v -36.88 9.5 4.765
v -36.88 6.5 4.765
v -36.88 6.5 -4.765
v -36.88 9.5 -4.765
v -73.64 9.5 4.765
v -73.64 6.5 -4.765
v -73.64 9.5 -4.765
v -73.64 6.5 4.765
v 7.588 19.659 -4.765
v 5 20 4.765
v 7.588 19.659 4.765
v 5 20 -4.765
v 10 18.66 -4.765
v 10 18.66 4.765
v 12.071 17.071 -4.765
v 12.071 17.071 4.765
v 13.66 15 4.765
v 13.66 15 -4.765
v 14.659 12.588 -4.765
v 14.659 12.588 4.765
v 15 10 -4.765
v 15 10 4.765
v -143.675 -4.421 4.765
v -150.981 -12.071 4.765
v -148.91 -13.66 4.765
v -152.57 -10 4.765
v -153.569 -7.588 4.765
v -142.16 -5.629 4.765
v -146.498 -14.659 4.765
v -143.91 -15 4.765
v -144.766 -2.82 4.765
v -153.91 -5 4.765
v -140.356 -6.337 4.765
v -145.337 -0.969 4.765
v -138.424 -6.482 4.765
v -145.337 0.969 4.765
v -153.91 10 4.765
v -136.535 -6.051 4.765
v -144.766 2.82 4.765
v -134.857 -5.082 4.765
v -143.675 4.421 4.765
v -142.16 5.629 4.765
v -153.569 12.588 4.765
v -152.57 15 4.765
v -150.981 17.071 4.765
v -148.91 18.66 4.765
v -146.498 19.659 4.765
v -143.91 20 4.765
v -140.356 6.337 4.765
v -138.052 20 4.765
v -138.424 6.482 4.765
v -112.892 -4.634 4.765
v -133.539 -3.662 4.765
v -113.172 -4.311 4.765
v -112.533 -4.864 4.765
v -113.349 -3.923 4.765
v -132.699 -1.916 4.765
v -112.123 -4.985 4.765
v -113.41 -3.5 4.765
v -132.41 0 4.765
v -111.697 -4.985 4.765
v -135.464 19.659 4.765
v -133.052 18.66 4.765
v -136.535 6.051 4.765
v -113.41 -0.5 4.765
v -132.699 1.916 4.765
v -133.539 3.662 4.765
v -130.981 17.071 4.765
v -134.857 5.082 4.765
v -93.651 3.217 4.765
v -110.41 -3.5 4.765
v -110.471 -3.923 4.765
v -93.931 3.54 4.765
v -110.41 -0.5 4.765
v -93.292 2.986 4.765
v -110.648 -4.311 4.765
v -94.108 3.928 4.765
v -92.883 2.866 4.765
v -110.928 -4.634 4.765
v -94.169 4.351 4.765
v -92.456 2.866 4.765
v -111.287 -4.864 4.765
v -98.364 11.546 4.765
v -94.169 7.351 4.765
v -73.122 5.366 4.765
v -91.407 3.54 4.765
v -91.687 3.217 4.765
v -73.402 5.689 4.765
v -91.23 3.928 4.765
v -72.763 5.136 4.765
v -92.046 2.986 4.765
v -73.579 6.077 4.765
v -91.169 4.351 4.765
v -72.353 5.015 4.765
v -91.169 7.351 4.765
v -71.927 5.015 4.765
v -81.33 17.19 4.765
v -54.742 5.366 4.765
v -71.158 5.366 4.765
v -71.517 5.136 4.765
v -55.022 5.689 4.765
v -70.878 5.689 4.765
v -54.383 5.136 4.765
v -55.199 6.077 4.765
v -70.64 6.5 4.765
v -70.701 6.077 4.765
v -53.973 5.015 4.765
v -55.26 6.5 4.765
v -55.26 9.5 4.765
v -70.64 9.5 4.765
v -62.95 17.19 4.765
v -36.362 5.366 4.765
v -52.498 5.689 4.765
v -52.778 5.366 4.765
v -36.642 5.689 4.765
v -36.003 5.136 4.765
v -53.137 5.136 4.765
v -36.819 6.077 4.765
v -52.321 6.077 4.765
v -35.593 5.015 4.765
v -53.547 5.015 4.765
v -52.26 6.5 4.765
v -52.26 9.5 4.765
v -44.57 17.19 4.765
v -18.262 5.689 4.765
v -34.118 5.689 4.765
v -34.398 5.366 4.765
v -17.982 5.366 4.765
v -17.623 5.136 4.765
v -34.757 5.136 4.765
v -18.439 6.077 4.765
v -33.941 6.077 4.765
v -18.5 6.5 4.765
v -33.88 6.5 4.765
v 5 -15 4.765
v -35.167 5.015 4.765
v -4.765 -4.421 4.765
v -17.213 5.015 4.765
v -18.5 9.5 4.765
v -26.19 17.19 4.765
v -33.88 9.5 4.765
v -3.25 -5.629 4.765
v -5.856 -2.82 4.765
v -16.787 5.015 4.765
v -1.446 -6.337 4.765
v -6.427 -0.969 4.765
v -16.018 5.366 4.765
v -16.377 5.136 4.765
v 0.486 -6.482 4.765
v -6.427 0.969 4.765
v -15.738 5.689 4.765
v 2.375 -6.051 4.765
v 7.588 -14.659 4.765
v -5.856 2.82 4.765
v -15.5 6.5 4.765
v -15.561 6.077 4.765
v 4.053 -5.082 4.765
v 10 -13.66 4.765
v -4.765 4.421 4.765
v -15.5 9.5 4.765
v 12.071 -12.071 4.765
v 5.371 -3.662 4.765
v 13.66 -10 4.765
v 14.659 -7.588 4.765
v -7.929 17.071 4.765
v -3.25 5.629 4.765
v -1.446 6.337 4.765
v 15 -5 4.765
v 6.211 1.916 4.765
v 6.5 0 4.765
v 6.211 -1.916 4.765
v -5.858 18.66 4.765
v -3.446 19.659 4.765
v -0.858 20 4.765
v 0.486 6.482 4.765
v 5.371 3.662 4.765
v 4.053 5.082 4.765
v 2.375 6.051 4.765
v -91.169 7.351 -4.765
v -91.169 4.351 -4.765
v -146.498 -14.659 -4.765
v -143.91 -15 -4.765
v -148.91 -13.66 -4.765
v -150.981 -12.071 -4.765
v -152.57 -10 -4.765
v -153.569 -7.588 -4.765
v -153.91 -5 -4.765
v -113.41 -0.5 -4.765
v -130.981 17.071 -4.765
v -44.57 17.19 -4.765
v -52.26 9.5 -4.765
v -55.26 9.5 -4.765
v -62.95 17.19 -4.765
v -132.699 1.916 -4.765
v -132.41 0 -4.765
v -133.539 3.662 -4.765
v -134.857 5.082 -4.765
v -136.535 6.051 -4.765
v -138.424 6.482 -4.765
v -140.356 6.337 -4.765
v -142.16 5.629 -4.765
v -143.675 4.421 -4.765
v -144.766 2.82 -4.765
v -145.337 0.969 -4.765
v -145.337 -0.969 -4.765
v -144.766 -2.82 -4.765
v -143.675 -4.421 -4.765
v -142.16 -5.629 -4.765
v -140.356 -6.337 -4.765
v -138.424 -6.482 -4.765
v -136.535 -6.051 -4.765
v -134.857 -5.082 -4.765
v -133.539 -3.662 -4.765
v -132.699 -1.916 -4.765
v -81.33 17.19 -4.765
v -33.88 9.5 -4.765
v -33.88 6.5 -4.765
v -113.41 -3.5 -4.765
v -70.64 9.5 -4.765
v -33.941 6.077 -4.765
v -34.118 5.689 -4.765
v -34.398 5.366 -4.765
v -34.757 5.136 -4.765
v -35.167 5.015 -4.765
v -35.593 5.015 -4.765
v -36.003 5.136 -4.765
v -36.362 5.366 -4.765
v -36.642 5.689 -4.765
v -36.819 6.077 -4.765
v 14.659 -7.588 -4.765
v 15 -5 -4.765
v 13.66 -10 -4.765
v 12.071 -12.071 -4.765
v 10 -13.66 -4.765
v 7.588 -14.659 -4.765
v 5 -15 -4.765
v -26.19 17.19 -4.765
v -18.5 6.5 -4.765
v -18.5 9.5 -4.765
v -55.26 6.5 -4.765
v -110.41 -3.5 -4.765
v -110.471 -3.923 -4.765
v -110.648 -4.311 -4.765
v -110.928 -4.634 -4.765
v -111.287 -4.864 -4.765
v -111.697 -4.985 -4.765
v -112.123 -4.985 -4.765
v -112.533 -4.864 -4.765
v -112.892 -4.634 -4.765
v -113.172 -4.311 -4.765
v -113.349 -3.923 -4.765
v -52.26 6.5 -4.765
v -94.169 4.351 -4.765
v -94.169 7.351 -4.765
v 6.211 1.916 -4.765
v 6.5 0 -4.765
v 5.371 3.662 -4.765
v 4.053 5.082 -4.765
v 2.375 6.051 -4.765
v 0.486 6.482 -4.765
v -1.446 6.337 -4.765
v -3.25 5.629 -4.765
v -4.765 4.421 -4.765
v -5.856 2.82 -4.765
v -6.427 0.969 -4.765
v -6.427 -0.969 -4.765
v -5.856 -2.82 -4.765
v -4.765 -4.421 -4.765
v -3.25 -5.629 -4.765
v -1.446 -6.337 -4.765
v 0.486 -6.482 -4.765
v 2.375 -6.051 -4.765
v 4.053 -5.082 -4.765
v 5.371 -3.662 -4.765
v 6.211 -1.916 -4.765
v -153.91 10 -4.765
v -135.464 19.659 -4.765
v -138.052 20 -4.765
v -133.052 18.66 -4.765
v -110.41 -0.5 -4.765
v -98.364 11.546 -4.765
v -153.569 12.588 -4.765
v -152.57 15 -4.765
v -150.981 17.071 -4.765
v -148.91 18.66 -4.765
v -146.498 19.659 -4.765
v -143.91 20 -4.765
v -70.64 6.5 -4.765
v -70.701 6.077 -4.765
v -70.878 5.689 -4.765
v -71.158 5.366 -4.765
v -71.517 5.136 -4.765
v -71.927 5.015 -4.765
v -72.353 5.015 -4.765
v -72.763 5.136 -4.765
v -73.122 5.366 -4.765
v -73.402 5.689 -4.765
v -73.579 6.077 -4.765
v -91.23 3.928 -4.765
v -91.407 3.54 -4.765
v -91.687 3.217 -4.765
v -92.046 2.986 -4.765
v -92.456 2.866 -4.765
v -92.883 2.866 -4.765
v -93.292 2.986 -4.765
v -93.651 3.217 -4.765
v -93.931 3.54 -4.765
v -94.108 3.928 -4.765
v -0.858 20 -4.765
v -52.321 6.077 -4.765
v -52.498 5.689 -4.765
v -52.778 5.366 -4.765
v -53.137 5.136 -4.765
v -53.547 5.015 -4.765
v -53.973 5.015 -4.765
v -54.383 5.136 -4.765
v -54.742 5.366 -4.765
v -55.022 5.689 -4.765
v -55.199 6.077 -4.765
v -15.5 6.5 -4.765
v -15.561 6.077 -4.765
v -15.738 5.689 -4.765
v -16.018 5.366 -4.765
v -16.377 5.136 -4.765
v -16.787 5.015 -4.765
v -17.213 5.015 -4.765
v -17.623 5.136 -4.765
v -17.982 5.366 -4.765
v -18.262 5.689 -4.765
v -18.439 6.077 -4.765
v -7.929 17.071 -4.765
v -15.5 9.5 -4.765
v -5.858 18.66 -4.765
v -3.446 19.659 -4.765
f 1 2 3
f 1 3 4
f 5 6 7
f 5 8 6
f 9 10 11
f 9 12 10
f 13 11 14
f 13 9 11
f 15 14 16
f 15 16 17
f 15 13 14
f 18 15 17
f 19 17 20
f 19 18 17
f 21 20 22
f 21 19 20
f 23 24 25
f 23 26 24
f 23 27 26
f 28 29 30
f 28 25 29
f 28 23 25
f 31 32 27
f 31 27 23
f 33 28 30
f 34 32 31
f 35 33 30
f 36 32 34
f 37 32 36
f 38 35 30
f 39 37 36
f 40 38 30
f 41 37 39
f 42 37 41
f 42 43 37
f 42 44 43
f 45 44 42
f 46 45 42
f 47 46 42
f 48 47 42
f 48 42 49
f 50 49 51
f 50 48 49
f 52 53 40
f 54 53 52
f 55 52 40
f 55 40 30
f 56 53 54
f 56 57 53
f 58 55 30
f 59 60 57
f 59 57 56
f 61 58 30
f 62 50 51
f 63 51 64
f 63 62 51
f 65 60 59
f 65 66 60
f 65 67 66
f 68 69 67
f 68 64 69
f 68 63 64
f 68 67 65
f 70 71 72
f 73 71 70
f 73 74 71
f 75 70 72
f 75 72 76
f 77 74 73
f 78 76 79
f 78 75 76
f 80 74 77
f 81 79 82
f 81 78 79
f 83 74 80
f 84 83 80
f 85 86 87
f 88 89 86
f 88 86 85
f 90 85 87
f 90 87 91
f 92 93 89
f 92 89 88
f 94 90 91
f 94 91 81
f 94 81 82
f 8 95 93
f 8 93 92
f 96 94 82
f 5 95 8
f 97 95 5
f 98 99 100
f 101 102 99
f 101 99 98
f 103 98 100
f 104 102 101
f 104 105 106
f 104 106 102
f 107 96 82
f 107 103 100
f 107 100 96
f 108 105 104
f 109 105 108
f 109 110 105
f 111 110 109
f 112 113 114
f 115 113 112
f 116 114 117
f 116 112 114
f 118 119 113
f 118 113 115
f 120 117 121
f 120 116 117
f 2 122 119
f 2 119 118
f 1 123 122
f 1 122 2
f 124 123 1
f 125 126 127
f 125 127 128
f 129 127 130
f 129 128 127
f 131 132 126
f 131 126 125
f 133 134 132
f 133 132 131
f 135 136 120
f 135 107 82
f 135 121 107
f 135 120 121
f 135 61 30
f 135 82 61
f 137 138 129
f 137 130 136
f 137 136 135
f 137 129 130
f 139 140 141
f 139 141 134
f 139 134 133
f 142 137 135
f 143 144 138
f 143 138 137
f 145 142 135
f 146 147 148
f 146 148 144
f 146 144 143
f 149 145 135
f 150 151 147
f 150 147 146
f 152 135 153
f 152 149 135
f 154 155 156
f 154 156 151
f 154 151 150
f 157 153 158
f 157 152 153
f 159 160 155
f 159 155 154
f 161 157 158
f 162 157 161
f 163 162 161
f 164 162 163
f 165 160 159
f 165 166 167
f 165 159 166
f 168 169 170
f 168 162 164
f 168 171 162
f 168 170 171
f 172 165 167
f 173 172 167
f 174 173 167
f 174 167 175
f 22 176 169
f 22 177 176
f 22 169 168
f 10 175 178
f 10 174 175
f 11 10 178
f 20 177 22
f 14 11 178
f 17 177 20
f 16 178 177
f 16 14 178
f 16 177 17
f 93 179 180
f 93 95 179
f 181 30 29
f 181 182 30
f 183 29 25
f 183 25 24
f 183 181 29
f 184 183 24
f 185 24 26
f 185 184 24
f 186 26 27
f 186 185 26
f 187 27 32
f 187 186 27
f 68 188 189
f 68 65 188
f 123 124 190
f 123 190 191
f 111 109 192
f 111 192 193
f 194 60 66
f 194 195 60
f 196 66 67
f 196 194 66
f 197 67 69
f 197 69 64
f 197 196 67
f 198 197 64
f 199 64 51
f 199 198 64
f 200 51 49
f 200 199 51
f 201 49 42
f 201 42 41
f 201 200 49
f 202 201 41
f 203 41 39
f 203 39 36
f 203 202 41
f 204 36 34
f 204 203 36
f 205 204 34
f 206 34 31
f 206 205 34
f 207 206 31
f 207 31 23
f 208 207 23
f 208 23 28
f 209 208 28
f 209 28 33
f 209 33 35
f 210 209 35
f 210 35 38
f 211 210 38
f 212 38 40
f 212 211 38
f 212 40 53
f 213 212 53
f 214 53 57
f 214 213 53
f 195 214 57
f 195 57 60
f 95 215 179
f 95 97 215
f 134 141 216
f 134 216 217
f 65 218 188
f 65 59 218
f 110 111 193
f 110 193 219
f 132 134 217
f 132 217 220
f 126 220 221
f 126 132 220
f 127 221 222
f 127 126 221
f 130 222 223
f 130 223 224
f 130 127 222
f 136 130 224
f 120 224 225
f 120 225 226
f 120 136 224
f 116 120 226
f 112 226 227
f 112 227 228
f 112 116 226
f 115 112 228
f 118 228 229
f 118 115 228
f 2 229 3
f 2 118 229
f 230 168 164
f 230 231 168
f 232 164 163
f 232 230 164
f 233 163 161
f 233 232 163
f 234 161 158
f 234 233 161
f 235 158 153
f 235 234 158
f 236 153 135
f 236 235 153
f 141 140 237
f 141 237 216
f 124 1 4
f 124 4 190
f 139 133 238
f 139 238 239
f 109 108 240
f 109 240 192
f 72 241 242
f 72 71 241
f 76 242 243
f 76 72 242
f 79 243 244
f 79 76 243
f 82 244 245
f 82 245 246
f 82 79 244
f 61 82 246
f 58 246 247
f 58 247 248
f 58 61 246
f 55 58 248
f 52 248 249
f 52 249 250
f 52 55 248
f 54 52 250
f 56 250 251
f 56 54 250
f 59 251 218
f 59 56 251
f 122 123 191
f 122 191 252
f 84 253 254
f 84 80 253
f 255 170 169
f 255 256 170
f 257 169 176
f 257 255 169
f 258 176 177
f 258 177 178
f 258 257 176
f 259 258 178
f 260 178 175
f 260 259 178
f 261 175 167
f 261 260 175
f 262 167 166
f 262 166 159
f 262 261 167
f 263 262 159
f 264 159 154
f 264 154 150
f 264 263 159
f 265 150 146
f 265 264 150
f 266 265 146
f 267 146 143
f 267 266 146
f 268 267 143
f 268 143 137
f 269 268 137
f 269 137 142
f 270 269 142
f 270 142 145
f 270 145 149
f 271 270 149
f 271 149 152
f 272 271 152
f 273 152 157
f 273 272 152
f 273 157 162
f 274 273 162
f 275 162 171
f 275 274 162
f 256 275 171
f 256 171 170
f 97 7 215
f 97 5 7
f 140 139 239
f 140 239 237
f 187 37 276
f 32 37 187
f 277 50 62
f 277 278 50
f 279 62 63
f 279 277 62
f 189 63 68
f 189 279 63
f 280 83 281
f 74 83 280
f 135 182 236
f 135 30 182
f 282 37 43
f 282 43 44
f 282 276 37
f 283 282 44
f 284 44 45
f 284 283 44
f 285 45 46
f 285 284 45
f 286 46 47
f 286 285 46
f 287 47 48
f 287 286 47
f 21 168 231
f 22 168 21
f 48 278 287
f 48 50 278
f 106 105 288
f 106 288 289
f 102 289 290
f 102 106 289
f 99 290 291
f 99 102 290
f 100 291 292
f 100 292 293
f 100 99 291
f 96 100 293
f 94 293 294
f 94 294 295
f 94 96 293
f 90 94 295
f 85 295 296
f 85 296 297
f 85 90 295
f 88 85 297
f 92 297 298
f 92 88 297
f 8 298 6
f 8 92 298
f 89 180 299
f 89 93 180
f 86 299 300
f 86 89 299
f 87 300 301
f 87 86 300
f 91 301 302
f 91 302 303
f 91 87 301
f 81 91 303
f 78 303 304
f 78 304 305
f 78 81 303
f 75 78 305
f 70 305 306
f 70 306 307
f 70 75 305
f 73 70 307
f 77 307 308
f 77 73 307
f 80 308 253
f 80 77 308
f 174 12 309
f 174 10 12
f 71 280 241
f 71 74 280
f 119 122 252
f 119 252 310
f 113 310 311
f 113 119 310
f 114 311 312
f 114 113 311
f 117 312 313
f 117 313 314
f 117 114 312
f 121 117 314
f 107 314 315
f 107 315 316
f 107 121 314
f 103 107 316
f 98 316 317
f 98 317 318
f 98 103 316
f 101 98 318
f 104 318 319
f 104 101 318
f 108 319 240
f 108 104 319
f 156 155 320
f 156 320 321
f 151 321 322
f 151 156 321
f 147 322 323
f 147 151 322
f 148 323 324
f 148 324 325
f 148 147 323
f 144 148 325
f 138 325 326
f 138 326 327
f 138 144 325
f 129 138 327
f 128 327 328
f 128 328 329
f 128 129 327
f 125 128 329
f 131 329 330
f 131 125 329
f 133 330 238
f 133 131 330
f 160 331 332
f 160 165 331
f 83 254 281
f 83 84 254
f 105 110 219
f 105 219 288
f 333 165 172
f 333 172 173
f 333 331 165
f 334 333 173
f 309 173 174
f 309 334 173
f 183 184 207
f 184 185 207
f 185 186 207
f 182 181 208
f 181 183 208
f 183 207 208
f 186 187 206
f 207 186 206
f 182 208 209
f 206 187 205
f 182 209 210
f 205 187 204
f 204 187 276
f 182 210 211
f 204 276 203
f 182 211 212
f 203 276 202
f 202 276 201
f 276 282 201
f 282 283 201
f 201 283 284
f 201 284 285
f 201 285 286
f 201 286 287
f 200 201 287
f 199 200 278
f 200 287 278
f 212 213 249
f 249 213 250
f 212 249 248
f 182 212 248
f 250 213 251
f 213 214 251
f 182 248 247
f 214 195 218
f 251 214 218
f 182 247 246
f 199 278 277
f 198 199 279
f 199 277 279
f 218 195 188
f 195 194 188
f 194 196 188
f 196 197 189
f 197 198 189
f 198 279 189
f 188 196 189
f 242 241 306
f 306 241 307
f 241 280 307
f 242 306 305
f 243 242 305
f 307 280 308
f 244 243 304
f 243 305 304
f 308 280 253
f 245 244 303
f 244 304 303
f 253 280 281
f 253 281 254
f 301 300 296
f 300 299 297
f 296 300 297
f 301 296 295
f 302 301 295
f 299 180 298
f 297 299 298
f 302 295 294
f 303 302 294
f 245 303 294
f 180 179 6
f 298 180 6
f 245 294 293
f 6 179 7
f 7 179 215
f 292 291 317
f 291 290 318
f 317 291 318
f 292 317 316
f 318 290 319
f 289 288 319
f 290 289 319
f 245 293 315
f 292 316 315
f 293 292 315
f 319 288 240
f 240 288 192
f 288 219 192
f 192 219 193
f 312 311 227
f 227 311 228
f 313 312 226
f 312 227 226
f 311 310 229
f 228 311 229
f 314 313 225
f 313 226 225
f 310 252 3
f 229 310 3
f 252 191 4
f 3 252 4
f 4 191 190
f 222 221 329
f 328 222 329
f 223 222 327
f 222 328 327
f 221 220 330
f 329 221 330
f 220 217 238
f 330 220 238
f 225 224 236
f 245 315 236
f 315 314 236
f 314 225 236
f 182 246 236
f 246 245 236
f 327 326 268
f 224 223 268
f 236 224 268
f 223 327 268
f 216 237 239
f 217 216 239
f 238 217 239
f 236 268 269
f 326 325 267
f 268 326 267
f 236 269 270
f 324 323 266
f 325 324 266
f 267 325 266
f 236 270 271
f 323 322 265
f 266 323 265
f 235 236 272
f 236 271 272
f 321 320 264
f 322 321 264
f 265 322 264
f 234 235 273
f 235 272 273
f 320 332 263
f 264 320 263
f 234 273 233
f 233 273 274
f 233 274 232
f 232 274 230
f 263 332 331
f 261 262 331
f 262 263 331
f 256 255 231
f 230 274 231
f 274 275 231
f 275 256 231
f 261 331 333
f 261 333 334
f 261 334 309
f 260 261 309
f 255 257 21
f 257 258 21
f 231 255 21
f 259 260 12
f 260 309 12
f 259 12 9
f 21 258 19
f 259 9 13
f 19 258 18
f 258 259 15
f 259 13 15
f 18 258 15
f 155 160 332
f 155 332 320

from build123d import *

# Parameters (mm, degrees)
CROQUIS9_R              = 6.5
SALIENTE_EXTRUIR1_DEPTH = 4.765
REDONDEO1_R             = 10


with BuildPart() as part:
    # Croquis9 → Saliente-Extruir1 (new, symmetric)
    with BuildSketch(Plane.XY):
        with BuildLine():
            Line((-5, 20), (-15.5, 9.5))
            Line((-15.5, 9.5), (-15.5, 6.5))
            ThreePointArc((-15.5, 6.5), (-17, 5), (-18.5, 6.5))
            Line((-18.5, 6.5), (-18.5, 9.5))
            Line((-18.5, 9.5), (-26.19, 17.19))
            Line((-26.19, 17.19), (-33.88, 9.5))
            Line((-33.88, 9.5), (-33.88, 6.5))
            ThreePointArc((-33.88, 6.5), (-35.38, 5), (-36.88, 6.5))
            Line((-36.88, 6.5), (-36.88, 9.5))
            Line((-36.88, 9.5), (-44.57, 17.19))
            Line((-44.57, 17.19), (-52.26, 9.5))
            Line((-52.26, 9.5), (-52.26, 6.5))
            ThreePointArc((-52.26, 6.5), (-53.76, 5), (-55.26, 6.5))
            Line((-55.26, 6.5), (-55.26, 9.5))
            Line((-55.26, 9.5), (-62.95, 17.19))
            Line((-62.95, 17.19), (-70.64, 9.5))
            Line((-70.64, 9.5), (-70.64, 6.5))
            ThreePointArc((-70.64, 6.5), (-72.14, 5), (-73.64, 6.5))
            Line((-73.64, 6.5), (-73.64, 9.5))
            Line((-73.64, 9.5), (-81.33, 17.19))
            Line((-81.33, 17.19), (-91.169058454, 7.350941546))
            Line((-91.169058454, 7.350941546), (-91.169058454, 4.350941546))
            ThreePointArc((-91.169058454, 4.350941546), (-92.669058454, 2.850941546), (-94.169058454, 4.350941546))
            Line((-94.169058454, 4.350941546), (-94.169058454, 7.350941546))
            Line((-94.169058454, 7.350941546), (-98.364058454, 11.545941546))
            Line((-98.364058454, 11.545941546), (-110.41, -0.5))
            Line((-110.41, -0.5), (-110.41, -3.5))
            ThreePointArc((-110.41, -3.5), (-111.91, -5), (-113.41, -3.5))
            Line((-113.41, -3.5), (-113.41, -0.5))
            Line((-113.41, -0.5), (-133.91, 20))
            Line((-133.91, 20), (-153.91, 20))
            Line((-153.91, 20), (-153.91, -15))
            Line((-153.91, -15), (15, -15))
            Line((15, -15), (15, 20))
            Line((15, 20), (-5, 20))
        make_face()
        with Locations((-138.91, 0)):
            Circle(CROQUIS9_R, mode=Mode.SUBTRACT)
        Circle(CROQUIS9_R, mode=Mode.SUBTRACT)
    extrude(amount=SALIENTE_EXTRUIR1_DEPTH, both=True)

    # Redondeo1
    redondeo1_edges = [part.edges().sort_by_distance(p)[0] for p in [
        (15, 20, 0),
        (15, -15, 0),
        (-153.91, -15, 0),
        (-153.91, 20, 0),
        (-133.91, 20, 0),
        (-5, 20, 0),
    ]]
    fillet(redondeo1_edges, radius=REDONDEO1_R)


solid = part.part
